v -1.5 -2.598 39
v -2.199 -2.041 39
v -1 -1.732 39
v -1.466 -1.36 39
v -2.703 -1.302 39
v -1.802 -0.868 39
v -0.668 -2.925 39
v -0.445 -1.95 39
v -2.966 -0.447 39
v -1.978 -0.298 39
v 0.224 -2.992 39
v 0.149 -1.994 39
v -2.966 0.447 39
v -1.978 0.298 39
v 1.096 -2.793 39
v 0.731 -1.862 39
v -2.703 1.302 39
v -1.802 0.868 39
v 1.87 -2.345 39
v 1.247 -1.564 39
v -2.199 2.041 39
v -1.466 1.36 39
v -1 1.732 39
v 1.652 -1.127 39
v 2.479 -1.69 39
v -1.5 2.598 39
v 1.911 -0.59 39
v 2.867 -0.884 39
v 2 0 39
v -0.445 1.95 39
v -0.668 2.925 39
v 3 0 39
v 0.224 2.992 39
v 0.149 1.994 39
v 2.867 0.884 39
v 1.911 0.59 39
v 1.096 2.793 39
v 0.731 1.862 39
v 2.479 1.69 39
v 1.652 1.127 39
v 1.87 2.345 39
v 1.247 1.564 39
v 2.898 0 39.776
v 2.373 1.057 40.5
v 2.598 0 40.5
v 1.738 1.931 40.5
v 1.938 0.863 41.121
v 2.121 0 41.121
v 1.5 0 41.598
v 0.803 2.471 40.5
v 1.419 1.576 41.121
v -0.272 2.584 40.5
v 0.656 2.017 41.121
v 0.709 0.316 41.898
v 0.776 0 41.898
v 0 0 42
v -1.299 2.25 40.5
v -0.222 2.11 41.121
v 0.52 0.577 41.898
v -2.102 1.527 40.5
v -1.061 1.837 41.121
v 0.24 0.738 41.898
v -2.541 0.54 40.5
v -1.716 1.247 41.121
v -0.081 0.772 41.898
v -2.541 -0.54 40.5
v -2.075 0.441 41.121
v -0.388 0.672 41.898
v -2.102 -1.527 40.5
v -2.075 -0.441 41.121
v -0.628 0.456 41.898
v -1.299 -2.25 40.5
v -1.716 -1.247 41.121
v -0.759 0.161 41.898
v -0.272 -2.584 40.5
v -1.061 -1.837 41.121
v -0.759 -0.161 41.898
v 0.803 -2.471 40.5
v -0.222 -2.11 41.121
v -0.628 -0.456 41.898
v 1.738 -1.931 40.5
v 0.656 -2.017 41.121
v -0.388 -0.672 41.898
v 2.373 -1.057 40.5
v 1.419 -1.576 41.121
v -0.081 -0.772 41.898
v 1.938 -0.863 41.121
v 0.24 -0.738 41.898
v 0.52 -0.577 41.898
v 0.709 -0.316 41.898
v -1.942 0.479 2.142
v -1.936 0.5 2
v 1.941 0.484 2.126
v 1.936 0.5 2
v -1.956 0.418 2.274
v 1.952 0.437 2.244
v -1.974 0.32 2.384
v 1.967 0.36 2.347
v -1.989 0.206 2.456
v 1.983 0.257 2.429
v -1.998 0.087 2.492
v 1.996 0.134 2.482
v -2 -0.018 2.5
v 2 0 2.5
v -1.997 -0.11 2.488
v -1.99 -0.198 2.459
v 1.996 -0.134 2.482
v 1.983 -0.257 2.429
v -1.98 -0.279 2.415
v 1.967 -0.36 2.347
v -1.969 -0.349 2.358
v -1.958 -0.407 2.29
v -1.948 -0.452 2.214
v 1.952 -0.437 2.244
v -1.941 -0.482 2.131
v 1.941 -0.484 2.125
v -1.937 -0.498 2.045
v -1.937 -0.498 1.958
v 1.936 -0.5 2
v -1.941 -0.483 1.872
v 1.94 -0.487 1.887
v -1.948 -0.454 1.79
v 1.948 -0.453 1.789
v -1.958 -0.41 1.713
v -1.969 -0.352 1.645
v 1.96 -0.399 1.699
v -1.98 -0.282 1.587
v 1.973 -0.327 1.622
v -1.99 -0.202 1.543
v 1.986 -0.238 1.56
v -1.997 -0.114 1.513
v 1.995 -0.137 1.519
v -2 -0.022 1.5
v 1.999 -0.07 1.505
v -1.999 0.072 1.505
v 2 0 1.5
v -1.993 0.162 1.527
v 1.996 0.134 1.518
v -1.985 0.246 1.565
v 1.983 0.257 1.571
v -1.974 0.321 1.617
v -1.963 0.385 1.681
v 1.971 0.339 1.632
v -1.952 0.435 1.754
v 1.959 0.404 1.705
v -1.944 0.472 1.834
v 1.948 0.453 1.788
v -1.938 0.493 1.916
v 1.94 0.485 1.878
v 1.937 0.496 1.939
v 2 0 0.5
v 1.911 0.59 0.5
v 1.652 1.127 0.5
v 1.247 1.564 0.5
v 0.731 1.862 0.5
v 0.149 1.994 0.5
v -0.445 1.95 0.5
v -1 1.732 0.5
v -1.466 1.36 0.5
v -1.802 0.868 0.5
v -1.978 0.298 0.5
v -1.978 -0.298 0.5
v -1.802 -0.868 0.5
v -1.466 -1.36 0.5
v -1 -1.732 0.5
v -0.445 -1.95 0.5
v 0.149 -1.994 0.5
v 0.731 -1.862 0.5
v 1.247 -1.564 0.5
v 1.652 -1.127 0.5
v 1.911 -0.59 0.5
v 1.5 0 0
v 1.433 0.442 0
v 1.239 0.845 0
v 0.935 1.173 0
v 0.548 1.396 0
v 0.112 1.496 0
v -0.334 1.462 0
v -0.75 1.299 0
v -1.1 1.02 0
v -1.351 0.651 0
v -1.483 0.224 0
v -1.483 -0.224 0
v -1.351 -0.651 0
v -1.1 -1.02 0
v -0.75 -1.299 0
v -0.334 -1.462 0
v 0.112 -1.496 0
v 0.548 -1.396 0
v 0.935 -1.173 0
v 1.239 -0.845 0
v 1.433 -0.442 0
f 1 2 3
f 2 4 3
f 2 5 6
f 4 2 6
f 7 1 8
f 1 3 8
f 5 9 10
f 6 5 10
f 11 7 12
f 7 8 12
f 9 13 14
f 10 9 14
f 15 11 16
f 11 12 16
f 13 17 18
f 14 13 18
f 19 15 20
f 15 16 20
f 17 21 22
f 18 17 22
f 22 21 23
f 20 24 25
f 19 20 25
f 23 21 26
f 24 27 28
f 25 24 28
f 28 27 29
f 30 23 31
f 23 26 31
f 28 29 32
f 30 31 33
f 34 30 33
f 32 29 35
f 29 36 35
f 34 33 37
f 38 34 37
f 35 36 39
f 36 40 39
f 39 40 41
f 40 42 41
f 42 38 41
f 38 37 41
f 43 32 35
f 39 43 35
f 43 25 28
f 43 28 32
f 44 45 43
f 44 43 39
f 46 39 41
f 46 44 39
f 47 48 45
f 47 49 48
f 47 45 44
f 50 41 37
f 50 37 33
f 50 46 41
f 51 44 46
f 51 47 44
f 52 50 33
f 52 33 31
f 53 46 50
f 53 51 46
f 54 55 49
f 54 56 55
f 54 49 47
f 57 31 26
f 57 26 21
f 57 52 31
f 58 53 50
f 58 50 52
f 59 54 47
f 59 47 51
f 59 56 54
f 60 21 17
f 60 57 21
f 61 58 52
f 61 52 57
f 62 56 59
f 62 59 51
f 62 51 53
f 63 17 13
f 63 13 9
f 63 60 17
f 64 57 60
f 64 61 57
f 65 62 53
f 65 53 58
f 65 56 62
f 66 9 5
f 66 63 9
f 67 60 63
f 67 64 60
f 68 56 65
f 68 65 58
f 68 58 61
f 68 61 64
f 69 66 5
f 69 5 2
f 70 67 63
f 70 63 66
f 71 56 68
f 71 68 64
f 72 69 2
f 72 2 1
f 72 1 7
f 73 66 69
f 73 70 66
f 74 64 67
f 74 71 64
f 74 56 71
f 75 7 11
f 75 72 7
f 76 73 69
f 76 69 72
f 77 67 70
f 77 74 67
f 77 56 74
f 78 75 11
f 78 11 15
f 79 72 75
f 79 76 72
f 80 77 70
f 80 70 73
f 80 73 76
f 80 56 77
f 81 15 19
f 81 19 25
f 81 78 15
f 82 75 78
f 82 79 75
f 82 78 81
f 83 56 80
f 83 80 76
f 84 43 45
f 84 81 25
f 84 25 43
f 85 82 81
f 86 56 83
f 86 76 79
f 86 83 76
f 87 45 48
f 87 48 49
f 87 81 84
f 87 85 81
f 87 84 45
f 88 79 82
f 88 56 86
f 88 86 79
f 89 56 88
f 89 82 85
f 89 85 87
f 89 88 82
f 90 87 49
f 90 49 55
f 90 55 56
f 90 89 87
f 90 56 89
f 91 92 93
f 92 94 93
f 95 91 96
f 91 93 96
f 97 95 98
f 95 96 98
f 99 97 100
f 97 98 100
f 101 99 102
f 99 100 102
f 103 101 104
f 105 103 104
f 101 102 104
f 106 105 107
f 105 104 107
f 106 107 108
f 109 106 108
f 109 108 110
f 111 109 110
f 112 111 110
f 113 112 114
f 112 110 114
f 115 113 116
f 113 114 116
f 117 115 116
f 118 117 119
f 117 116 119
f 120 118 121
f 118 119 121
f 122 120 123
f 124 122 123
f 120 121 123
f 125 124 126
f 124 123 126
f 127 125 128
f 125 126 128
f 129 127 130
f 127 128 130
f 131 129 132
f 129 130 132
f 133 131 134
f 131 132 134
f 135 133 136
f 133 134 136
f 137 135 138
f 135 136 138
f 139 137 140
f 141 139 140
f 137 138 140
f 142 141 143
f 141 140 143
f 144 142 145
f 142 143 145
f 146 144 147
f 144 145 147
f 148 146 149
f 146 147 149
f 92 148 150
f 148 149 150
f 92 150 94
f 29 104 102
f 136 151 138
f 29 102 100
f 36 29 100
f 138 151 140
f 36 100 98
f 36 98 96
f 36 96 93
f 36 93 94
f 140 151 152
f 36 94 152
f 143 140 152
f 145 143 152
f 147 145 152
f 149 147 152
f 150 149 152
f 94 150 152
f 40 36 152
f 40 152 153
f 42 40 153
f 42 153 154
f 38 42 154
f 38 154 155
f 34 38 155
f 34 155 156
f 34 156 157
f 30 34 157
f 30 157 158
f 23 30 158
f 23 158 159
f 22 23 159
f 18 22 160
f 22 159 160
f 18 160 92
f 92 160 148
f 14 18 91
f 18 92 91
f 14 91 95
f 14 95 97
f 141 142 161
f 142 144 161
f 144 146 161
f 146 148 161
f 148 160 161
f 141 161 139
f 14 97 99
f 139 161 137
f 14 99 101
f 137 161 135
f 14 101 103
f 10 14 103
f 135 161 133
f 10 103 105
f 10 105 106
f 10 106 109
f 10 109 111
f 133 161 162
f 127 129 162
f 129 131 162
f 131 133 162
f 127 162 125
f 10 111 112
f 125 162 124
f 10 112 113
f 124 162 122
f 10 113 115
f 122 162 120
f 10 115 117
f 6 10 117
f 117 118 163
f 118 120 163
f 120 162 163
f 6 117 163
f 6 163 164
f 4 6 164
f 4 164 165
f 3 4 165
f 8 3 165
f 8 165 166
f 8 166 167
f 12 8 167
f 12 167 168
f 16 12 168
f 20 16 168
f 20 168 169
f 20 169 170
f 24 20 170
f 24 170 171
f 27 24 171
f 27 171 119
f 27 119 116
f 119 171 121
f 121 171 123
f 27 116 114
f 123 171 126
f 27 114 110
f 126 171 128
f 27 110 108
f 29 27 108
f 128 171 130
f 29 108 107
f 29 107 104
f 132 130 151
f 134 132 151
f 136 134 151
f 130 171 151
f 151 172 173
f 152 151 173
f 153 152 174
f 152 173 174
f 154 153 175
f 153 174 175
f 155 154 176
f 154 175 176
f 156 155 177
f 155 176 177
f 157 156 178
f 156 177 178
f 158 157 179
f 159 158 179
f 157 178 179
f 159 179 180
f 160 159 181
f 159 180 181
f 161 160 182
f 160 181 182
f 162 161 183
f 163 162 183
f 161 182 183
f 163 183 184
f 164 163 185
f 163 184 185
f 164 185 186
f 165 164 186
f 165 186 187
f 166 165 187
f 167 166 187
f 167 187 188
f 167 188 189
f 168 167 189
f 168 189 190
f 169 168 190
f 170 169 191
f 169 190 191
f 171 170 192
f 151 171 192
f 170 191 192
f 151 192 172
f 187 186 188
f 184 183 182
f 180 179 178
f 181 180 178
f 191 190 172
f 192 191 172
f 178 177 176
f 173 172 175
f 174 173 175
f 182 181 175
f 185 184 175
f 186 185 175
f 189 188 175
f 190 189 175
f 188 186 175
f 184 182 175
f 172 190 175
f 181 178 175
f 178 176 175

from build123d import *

# Parameters (mm, degrees)
F0_R     = 2
F1_DEPTH = 39
F2_SIZE2 = 0.5
F2_SIZE  = 0.5
F3_R     = 3
F4_DEPTH = 3
F5_R     = 2.99999
F6_R     = 0.5
F7_DEPTH = 12.5


# Not quite as in the source:
# - a fillet or chamfer is up to 0.001 mm smaller than in the source, because OpenCascade refuses the exact size


with BuildPart() as f1:
    # F0 (on Top) → F1 (new body)
    with BuildSketch(Plane.XY):
        Circle(F0_R)
    extrude(amount=F1_DEPTH)

    # F2
    f2_edges = [f1.edges().sort_by_distance(p)[0] for p in [
        (-2, 0, 0),
    ]]
    chamfer(f2_edges, length=F2_SIZE, length2=F2_SIZE2)

    # F3 (on face) → F4 (join)
    with BuildSketch(Plane.XY.offset(39)):
        Circle(F3_R)
    extrude(amount=F4_DEPTH)

    # F5 (radius 3 in the source; OpenCascade refuses exactly that, so slightly less here)
    f5_edges = [f1.edges().sort_by_distance(p)[0] for p in [
        (-3, 0, 42),
    ]]
    fillet(f5_edges, radius=F5_R)

    # F6 (on Right) → F7 (cut, symmetric)
    with BuildSketch(Plane.YZ):
        with Locations((0, 2)):
            Circle(F6_R)
    extrude(amount=F7_DEPTH, both=True, mode=Mode.SUBTRACT)


solid = f1.part
